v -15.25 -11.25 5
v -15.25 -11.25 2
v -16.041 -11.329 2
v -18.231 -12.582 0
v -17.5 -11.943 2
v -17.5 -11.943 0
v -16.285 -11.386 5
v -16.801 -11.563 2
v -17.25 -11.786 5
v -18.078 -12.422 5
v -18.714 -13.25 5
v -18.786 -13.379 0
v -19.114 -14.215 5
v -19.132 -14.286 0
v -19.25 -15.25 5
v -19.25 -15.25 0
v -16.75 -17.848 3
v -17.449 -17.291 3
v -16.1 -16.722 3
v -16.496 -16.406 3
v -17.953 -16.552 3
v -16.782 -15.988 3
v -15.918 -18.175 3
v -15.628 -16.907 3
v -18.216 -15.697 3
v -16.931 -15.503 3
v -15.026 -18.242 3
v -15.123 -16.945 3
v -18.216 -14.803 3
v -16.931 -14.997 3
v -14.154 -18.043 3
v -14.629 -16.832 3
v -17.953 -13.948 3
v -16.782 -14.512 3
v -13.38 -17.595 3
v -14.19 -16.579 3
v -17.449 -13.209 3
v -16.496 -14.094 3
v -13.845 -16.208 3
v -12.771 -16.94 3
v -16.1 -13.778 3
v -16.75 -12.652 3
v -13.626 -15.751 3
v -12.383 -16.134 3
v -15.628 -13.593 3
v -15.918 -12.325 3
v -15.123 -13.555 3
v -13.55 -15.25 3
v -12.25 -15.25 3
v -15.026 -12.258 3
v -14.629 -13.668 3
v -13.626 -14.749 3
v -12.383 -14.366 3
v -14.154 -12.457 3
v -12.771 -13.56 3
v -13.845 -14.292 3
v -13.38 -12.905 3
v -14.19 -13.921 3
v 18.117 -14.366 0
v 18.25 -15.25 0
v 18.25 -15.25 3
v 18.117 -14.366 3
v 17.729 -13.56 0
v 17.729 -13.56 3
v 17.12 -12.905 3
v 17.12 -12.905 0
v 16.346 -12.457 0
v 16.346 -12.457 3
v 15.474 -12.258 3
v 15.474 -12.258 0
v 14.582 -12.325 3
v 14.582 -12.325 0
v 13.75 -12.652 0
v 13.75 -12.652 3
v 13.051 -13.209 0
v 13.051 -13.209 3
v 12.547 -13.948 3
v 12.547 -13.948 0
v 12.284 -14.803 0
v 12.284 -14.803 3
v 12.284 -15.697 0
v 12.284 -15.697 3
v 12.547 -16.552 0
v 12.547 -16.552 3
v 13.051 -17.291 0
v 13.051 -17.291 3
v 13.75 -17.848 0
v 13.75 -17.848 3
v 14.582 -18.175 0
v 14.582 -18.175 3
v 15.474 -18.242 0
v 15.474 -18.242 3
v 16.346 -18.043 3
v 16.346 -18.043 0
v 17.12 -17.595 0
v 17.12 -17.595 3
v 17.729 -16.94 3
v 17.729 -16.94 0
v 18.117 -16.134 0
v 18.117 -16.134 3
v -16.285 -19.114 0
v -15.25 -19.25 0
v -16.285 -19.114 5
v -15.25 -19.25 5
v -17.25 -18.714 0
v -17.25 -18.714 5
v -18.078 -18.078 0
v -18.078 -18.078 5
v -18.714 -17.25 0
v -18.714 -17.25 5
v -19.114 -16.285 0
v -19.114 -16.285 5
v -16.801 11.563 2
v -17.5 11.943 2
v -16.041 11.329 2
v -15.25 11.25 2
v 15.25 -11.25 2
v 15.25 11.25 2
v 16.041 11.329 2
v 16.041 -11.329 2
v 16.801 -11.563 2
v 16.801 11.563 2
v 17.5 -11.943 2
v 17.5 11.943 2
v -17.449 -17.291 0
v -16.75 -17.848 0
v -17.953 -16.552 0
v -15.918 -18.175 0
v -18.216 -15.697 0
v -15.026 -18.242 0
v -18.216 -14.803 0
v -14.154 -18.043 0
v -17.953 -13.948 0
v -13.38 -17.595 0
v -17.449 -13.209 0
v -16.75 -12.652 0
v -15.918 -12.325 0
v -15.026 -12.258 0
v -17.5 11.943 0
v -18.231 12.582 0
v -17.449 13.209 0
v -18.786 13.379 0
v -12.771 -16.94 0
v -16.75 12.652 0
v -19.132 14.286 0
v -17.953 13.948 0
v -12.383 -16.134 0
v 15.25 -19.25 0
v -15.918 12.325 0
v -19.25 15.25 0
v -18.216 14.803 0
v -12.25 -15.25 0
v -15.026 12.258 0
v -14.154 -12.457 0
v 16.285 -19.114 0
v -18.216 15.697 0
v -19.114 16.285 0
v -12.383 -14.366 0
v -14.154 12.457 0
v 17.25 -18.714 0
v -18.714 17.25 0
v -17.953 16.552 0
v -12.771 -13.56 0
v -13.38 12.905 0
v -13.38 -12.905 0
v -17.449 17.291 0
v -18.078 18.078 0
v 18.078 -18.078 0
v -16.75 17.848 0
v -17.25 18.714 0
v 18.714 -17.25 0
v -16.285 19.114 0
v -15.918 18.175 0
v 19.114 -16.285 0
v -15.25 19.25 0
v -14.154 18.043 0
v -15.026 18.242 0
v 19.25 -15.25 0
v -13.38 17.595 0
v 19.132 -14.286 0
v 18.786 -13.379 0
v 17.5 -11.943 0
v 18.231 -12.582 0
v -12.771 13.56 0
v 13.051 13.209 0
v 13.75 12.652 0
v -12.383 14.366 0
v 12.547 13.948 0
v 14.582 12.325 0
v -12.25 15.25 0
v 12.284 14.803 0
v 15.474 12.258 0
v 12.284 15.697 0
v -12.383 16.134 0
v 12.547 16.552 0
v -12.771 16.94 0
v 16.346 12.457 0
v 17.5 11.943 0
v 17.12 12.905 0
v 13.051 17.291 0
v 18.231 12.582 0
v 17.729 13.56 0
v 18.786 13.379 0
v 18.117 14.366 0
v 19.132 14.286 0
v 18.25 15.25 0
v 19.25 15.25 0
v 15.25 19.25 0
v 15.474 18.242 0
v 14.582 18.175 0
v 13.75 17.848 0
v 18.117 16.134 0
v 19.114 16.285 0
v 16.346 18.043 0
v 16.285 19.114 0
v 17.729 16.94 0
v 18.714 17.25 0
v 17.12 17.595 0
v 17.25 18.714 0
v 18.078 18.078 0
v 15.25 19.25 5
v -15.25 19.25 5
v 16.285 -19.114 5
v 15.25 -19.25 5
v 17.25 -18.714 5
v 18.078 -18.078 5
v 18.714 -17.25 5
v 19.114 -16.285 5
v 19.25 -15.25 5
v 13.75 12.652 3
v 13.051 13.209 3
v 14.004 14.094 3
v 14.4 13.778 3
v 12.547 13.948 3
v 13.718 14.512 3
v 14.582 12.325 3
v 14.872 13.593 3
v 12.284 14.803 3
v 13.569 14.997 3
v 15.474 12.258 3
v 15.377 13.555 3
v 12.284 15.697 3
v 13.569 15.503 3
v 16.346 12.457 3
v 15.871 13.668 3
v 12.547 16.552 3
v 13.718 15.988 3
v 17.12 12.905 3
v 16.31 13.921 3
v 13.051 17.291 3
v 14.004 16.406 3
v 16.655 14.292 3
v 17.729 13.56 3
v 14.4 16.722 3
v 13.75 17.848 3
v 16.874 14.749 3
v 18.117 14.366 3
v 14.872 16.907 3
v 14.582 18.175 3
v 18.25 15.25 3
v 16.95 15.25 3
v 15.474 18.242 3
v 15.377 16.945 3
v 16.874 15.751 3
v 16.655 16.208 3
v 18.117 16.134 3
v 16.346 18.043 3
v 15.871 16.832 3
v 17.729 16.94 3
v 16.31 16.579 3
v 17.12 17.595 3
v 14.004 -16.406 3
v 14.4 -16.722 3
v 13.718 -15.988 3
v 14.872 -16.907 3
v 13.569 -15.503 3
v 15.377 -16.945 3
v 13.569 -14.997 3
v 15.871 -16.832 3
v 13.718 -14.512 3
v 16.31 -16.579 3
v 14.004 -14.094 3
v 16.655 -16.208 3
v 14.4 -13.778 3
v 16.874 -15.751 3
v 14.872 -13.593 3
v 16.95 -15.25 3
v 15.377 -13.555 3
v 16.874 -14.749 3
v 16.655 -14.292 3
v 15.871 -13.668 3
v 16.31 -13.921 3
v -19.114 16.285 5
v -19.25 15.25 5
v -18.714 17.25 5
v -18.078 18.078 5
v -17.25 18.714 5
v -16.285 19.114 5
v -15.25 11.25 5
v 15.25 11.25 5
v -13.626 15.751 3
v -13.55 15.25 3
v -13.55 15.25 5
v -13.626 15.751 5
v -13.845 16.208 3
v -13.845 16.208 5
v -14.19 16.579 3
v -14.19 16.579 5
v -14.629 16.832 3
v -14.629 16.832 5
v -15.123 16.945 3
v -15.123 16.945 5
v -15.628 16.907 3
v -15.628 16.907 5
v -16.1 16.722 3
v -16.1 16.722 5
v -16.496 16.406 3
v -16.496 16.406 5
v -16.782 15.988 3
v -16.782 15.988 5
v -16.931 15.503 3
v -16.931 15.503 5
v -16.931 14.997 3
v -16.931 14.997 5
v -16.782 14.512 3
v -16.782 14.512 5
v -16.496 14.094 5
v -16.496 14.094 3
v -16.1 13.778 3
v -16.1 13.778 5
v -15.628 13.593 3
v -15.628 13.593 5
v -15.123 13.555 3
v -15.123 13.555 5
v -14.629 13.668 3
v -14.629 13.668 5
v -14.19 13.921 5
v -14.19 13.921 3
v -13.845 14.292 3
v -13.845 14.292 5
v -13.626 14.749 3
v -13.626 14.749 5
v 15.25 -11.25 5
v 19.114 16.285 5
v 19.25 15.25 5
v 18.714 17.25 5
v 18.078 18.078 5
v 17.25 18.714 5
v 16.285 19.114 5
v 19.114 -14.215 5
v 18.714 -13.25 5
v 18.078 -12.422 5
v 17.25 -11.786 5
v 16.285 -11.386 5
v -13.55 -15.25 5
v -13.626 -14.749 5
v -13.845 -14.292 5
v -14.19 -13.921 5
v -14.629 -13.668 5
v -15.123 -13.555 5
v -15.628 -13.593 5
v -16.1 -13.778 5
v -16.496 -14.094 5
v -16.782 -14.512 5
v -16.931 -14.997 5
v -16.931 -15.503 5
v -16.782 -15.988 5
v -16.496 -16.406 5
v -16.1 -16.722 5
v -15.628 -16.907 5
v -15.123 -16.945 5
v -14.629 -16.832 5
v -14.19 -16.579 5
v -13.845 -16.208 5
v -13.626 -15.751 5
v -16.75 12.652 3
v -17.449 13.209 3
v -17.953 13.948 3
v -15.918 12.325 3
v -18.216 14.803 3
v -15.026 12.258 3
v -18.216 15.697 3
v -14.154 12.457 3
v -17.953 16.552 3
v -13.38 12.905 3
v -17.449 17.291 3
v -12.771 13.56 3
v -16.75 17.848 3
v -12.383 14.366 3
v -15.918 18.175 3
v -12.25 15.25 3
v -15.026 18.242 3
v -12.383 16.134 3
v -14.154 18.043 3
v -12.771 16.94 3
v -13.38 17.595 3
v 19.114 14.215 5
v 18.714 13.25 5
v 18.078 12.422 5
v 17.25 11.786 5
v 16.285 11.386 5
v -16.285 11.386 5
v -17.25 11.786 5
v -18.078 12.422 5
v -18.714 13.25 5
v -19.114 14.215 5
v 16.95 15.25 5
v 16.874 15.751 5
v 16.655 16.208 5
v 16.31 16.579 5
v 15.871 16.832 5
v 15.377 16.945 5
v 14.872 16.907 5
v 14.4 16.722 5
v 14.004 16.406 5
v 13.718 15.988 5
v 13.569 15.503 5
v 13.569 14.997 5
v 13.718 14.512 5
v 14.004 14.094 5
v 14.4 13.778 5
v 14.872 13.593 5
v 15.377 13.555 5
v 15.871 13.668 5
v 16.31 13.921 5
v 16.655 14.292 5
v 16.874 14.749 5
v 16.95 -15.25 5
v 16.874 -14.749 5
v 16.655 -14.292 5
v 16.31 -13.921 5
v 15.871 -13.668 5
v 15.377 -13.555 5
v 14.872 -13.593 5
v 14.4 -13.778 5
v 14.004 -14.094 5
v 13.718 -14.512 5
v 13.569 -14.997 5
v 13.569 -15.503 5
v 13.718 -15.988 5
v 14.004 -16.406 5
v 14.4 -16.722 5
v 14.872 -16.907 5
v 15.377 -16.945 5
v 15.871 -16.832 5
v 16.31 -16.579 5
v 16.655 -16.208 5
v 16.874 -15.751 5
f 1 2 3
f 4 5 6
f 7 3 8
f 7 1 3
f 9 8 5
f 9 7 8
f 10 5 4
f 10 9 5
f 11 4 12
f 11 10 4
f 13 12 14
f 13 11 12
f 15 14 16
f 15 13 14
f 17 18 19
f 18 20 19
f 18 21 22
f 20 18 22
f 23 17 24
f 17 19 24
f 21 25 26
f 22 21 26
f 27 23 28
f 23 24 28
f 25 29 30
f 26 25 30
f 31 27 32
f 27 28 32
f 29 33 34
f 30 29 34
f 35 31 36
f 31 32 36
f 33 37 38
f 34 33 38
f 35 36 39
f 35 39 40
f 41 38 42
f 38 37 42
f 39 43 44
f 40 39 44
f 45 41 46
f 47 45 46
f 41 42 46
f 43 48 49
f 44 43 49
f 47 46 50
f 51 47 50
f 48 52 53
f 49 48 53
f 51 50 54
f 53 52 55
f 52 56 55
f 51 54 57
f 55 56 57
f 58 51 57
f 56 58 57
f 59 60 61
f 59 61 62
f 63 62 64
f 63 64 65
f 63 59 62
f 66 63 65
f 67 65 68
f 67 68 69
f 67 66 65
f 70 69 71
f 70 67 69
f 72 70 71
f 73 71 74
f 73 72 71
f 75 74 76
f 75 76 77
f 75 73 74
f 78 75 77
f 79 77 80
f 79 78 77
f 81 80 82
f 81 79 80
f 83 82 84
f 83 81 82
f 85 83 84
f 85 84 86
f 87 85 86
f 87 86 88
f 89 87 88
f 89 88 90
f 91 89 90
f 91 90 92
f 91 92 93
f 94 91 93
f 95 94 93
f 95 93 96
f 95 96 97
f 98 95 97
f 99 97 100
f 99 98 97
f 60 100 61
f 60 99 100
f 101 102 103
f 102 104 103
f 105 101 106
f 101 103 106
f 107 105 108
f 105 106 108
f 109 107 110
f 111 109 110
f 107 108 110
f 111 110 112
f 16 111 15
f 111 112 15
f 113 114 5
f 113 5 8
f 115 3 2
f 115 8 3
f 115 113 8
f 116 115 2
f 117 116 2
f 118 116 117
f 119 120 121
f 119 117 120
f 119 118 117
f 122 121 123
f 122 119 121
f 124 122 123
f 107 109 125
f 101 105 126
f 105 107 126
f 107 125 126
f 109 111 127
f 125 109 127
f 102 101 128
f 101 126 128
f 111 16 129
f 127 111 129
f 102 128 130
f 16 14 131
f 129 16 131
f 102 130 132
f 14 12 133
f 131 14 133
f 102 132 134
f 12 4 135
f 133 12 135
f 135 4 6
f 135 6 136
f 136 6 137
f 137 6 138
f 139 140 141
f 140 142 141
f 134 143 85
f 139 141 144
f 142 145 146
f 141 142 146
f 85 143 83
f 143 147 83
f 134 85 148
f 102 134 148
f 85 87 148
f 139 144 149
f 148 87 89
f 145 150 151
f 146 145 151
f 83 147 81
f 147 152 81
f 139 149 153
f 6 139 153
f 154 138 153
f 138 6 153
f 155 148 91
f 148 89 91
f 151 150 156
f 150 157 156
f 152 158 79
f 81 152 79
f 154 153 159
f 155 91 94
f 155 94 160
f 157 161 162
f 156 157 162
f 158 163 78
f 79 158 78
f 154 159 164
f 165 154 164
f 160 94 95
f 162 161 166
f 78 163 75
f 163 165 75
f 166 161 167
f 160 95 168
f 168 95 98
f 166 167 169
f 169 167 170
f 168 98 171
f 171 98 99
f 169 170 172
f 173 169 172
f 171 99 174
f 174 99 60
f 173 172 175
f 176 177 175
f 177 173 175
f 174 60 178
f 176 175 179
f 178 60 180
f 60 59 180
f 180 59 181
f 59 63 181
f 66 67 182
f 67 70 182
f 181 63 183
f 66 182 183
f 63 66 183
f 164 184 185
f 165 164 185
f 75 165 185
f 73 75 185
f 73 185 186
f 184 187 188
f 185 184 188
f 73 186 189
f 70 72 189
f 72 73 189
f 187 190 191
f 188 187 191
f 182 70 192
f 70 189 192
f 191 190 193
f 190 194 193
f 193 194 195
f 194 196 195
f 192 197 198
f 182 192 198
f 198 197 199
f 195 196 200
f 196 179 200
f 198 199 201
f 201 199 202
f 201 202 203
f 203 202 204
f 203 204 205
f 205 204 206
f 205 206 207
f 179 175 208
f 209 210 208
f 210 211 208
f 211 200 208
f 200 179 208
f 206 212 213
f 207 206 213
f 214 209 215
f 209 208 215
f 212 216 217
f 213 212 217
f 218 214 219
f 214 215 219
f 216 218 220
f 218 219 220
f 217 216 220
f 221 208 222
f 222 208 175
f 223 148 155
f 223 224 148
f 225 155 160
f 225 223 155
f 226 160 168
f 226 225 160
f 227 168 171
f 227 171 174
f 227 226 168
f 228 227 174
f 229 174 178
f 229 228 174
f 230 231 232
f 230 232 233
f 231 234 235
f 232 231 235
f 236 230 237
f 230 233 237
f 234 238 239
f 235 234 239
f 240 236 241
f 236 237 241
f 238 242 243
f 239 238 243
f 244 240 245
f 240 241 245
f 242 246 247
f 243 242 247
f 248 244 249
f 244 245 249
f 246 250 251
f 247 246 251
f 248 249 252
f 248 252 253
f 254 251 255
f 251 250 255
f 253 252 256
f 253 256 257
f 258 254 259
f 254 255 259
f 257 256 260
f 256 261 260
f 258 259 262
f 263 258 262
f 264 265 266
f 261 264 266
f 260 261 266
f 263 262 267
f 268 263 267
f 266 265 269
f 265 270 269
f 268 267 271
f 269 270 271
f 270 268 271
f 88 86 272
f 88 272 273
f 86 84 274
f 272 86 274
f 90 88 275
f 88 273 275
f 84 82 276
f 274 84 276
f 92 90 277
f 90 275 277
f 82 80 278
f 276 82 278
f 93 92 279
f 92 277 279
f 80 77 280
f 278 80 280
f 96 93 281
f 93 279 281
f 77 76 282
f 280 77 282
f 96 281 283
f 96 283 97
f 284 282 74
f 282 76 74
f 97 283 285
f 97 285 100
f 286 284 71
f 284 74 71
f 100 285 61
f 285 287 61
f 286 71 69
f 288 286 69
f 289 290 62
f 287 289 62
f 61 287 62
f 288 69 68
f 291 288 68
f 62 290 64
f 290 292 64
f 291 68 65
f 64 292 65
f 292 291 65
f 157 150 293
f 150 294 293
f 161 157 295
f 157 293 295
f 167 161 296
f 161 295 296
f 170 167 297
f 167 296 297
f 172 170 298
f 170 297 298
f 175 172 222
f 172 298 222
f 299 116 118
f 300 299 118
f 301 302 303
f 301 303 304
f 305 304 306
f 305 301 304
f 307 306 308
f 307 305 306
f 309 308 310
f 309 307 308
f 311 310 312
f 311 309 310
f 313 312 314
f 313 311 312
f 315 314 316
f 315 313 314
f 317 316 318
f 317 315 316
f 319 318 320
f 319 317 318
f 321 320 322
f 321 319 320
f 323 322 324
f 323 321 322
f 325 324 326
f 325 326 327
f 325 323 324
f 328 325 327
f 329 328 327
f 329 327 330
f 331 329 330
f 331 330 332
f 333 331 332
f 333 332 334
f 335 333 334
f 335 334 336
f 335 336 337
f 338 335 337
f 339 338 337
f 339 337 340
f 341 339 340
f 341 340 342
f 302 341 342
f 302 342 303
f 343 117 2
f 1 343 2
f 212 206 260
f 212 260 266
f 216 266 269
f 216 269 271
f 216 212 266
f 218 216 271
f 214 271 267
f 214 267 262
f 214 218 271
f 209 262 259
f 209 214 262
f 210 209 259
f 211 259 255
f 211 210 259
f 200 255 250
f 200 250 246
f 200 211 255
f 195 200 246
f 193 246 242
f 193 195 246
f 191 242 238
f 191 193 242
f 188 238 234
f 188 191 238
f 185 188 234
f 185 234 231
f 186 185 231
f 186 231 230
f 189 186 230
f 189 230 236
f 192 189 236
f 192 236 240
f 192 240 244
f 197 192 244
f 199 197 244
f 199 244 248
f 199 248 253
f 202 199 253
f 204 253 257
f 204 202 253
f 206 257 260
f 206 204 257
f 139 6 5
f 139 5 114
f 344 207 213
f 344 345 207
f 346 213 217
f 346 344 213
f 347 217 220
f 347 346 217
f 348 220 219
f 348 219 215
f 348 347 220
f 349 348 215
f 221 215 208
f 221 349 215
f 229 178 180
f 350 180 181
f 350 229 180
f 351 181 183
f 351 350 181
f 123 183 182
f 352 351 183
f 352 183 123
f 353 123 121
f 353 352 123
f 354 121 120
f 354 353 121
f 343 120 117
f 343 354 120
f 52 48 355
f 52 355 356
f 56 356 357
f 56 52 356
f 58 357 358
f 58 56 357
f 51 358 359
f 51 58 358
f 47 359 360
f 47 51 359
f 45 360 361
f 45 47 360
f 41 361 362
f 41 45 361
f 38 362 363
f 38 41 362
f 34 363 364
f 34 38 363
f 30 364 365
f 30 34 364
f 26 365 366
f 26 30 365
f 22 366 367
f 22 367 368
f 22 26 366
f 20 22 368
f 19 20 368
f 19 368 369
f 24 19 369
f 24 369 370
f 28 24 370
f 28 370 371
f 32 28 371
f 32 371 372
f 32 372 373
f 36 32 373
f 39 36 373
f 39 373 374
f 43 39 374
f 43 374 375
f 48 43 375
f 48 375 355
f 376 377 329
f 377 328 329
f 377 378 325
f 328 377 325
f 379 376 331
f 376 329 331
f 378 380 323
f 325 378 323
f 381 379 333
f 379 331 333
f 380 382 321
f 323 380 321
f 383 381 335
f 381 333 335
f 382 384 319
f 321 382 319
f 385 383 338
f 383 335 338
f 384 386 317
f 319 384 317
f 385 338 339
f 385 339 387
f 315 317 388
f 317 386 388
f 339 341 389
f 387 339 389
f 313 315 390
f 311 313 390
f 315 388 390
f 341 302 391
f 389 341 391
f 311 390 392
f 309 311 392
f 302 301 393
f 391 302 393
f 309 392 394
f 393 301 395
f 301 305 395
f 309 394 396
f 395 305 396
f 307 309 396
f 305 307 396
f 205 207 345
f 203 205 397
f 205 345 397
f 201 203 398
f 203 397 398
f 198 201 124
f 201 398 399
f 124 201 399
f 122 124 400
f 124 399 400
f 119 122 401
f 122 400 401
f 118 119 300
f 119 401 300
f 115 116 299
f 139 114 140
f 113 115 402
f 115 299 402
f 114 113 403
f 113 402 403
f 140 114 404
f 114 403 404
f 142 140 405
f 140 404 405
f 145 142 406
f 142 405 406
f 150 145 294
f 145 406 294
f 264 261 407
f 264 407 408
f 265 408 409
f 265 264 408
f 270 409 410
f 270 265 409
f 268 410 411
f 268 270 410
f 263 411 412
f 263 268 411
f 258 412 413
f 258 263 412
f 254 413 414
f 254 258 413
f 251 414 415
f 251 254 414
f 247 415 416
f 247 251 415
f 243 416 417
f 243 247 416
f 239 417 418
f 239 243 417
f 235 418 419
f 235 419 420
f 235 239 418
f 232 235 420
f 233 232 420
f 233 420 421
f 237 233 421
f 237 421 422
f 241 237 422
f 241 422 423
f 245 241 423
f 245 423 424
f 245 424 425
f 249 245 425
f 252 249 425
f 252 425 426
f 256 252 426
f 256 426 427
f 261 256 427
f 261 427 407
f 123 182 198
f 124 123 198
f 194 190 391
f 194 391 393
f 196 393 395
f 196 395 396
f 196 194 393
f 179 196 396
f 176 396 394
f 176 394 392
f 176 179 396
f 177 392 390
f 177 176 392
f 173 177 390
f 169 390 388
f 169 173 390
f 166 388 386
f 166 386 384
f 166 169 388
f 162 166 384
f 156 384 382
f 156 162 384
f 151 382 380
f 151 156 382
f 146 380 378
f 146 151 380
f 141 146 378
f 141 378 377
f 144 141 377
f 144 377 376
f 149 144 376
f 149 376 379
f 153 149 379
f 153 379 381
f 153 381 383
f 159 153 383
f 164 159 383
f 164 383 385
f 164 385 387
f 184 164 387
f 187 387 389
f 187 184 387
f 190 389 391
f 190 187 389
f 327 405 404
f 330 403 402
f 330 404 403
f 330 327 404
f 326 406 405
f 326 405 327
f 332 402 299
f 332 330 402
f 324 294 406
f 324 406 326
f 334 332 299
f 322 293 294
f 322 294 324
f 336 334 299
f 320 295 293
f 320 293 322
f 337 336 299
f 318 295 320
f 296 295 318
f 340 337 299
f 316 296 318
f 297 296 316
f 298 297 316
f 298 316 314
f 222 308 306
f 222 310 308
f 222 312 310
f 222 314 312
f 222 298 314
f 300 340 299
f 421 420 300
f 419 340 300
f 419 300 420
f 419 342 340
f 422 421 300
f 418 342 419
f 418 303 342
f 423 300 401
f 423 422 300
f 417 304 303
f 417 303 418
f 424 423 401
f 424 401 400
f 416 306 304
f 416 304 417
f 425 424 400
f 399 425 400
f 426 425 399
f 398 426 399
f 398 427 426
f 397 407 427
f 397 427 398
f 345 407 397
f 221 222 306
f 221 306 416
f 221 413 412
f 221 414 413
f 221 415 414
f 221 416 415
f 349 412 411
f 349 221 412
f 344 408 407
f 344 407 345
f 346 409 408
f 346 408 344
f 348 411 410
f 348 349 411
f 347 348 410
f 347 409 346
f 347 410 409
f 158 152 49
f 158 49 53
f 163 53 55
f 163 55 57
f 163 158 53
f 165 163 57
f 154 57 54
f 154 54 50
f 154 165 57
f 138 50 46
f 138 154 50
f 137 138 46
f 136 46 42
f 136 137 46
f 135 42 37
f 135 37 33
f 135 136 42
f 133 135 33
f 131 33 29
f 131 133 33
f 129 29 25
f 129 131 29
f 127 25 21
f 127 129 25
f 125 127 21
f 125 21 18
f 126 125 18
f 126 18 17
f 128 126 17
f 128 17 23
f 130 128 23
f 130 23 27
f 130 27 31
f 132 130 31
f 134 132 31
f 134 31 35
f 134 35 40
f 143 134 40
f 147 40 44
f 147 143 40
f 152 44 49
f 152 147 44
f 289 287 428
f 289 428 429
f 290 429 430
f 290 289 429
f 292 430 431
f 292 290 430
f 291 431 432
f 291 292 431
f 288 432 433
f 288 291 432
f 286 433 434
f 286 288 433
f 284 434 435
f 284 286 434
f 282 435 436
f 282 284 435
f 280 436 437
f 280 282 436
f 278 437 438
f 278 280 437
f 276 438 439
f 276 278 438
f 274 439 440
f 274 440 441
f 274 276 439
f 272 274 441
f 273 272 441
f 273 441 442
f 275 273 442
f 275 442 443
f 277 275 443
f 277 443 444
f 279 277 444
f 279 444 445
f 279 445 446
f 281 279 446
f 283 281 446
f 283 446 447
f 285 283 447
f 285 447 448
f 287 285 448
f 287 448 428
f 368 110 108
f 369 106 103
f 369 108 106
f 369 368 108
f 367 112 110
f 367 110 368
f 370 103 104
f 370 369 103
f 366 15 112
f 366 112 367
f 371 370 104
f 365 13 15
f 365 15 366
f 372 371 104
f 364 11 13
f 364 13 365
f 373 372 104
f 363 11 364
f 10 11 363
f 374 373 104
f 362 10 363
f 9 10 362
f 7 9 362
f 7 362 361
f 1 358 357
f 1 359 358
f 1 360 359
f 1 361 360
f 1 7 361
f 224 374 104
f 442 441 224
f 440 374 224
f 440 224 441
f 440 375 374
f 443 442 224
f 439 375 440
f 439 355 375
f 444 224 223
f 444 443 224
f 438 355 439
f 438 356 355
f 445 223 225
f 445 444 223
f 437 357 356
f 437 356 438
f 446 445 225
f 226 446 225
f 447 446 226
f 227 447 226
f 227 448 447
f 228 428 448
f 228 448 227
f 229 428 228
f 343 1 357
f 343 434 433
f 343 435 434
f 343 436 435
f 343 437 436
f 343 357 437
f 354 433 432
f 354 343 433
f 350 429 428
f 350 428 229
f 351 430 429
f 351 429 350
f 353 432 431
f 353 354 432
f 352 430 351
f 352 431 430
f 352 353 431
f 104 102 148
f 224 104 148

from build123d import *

# Parameters (mm, degrees)
F0_W     = 35
F0_H     = 22.5
F1_DEPTH = 2
F0_R     = 1.7
F2_DEPTH = 5
F3_R     = 4
F3_R_2   = 3.99999
F4_R     = 3
F5_DEPTH = 3


# Not quite as in the source:
# - a fillet or chamfer is up to 0.001 mm smaller than in the source, because OpenCascade refuses the exact size


with BuildPart() as f1:
    # F0 (on Top) → F1 (new body)
    with BuildSketch(Plane.XY):
        Rectangle(F0_W, F0_H)
    extrude(amount=F1_DEPTH)

    # F0 (on Top) → F2 (join)
    with BuildSketch(Plane.XY):
        Polygon((-19.25, -11.25), (-19.25, -19.25), (19.25, -19.25), (19.25, -11.25), (17.5, -11.25), (-17.5, -11.25), align=None)
        with Locations((-15.25, -15.25)):
            Circle(F0_R, mode=Mode.SUBTRACT)
        with Locations((15.25, -15.25)):
            Circle(F0_R, mode=Mode.SUBTRACT)
        Polygon((-19.25, 19.25), (-19.25, 11.25), (-17.5, 11.25), (17.5, 11.25), (19.25, 11.25), (19.25, 19.25), align=None)
        with Locations((-15.25, 15.25)):
            Circle(F0_R, mode=Mode.SUBTRACT)
        with Locations((15.25, 15.25)):
            Circle(F0_R, mode=Mode.SUBTRACT)
    extrude(amount=F2_DEPTH)

    # F3 (call 1 of 8: OpenCascade refuses the feature's edges together)
    f3_edges = [f1.edges().sort_by_distance(p)[0] for p in [
        (19.25, -19.25, 2.5),
    ]]
    fillet(f3_edges, radius=F3_R)

    # F3#2 (call 2 of 8) (radius 4 in the source; OpenCascade refuses exactly that, so slightly less here)
    f3_2_edges = [f1.edges().sort_by_distance(p)[0] for p in [
        (19.25, -11.25, 2.5),
    ]]
    fillet(f3_2_edges, radius=F3_R_2)

    # F3#3 (call 3 of 8)
    f3_3_edges = [f1.edges().sort_by_distance(p)[0] for p in [
        (-19.25, -19.25, 2.5),
    ]]
    fillet(f3_3_edges, radius=F3_R)

    # F3#4 (call 4 of 8)
    f3_4_edges = [f1.edges().sort_by_distance(p)[0] for p in [
        (-19.25, 11.25, 2.5),
    ]]
    fillet(f3_4_edges, radius=F3_R)

    # F3#5 (call 5 of 8)
    f3_5_edges = [f1.edges().sort_by_distance(p)[0] for p in [
        (19.25, 11.25, 2.5),
    ]]
    fillet(f3_5_edges, radius=F3_R)

    # F3#6 (call 6 of 8) (radius 4 in the source; OpenCascade refuses exactly that, so slightly less here)
    f3_6_edges = [f1.edges().sort_by_distance(p)[0] for p in [
        (19.25, 19.25, 2.5),
    ]]
    fillet(f3_6_edges, radius=F3_R_2)

    # F3#7 (call 7 of 8) (radius 4 in the source; OpenCascade refuses exactly that, so slightly less here)
    f3_7_edges = [f1.edges().sort_by_distance(p)[0] for p in [
        (-19.25, -11.25, 2.5),
    ]]
    fillet(f3_7_edges, radius=F3_R_2)

    # F3#8 (call 8 of 8) (radius 4 in the source; OpenCascade refuses exactly that, so slightly less here)
    f3_8_edges = [f1.edges().sort_by_distance(p)[0] for p in [
        (-19.25, 19.25, 2.5),
    ]]
    fillet(f3_8_edges, radius=F3_R_2)

    # F4 (on face) → F5 (cut)
    with BuildSketch(Plane.XY):
        with Locations((-15.25, -15.25)):
            Circle(F4_R)
        with Locations((15.25, -15.25)):
            Circle(F4_R)
        with Locations((15.25, 15.25)):
            Circle(F4_R)
        with Locations((-15.25, 15.25)):
            Circle(F4_R)
    extrude(amount=F5_DEPTH, mode=Mode.SUBTRACT)


solid = f1.part
